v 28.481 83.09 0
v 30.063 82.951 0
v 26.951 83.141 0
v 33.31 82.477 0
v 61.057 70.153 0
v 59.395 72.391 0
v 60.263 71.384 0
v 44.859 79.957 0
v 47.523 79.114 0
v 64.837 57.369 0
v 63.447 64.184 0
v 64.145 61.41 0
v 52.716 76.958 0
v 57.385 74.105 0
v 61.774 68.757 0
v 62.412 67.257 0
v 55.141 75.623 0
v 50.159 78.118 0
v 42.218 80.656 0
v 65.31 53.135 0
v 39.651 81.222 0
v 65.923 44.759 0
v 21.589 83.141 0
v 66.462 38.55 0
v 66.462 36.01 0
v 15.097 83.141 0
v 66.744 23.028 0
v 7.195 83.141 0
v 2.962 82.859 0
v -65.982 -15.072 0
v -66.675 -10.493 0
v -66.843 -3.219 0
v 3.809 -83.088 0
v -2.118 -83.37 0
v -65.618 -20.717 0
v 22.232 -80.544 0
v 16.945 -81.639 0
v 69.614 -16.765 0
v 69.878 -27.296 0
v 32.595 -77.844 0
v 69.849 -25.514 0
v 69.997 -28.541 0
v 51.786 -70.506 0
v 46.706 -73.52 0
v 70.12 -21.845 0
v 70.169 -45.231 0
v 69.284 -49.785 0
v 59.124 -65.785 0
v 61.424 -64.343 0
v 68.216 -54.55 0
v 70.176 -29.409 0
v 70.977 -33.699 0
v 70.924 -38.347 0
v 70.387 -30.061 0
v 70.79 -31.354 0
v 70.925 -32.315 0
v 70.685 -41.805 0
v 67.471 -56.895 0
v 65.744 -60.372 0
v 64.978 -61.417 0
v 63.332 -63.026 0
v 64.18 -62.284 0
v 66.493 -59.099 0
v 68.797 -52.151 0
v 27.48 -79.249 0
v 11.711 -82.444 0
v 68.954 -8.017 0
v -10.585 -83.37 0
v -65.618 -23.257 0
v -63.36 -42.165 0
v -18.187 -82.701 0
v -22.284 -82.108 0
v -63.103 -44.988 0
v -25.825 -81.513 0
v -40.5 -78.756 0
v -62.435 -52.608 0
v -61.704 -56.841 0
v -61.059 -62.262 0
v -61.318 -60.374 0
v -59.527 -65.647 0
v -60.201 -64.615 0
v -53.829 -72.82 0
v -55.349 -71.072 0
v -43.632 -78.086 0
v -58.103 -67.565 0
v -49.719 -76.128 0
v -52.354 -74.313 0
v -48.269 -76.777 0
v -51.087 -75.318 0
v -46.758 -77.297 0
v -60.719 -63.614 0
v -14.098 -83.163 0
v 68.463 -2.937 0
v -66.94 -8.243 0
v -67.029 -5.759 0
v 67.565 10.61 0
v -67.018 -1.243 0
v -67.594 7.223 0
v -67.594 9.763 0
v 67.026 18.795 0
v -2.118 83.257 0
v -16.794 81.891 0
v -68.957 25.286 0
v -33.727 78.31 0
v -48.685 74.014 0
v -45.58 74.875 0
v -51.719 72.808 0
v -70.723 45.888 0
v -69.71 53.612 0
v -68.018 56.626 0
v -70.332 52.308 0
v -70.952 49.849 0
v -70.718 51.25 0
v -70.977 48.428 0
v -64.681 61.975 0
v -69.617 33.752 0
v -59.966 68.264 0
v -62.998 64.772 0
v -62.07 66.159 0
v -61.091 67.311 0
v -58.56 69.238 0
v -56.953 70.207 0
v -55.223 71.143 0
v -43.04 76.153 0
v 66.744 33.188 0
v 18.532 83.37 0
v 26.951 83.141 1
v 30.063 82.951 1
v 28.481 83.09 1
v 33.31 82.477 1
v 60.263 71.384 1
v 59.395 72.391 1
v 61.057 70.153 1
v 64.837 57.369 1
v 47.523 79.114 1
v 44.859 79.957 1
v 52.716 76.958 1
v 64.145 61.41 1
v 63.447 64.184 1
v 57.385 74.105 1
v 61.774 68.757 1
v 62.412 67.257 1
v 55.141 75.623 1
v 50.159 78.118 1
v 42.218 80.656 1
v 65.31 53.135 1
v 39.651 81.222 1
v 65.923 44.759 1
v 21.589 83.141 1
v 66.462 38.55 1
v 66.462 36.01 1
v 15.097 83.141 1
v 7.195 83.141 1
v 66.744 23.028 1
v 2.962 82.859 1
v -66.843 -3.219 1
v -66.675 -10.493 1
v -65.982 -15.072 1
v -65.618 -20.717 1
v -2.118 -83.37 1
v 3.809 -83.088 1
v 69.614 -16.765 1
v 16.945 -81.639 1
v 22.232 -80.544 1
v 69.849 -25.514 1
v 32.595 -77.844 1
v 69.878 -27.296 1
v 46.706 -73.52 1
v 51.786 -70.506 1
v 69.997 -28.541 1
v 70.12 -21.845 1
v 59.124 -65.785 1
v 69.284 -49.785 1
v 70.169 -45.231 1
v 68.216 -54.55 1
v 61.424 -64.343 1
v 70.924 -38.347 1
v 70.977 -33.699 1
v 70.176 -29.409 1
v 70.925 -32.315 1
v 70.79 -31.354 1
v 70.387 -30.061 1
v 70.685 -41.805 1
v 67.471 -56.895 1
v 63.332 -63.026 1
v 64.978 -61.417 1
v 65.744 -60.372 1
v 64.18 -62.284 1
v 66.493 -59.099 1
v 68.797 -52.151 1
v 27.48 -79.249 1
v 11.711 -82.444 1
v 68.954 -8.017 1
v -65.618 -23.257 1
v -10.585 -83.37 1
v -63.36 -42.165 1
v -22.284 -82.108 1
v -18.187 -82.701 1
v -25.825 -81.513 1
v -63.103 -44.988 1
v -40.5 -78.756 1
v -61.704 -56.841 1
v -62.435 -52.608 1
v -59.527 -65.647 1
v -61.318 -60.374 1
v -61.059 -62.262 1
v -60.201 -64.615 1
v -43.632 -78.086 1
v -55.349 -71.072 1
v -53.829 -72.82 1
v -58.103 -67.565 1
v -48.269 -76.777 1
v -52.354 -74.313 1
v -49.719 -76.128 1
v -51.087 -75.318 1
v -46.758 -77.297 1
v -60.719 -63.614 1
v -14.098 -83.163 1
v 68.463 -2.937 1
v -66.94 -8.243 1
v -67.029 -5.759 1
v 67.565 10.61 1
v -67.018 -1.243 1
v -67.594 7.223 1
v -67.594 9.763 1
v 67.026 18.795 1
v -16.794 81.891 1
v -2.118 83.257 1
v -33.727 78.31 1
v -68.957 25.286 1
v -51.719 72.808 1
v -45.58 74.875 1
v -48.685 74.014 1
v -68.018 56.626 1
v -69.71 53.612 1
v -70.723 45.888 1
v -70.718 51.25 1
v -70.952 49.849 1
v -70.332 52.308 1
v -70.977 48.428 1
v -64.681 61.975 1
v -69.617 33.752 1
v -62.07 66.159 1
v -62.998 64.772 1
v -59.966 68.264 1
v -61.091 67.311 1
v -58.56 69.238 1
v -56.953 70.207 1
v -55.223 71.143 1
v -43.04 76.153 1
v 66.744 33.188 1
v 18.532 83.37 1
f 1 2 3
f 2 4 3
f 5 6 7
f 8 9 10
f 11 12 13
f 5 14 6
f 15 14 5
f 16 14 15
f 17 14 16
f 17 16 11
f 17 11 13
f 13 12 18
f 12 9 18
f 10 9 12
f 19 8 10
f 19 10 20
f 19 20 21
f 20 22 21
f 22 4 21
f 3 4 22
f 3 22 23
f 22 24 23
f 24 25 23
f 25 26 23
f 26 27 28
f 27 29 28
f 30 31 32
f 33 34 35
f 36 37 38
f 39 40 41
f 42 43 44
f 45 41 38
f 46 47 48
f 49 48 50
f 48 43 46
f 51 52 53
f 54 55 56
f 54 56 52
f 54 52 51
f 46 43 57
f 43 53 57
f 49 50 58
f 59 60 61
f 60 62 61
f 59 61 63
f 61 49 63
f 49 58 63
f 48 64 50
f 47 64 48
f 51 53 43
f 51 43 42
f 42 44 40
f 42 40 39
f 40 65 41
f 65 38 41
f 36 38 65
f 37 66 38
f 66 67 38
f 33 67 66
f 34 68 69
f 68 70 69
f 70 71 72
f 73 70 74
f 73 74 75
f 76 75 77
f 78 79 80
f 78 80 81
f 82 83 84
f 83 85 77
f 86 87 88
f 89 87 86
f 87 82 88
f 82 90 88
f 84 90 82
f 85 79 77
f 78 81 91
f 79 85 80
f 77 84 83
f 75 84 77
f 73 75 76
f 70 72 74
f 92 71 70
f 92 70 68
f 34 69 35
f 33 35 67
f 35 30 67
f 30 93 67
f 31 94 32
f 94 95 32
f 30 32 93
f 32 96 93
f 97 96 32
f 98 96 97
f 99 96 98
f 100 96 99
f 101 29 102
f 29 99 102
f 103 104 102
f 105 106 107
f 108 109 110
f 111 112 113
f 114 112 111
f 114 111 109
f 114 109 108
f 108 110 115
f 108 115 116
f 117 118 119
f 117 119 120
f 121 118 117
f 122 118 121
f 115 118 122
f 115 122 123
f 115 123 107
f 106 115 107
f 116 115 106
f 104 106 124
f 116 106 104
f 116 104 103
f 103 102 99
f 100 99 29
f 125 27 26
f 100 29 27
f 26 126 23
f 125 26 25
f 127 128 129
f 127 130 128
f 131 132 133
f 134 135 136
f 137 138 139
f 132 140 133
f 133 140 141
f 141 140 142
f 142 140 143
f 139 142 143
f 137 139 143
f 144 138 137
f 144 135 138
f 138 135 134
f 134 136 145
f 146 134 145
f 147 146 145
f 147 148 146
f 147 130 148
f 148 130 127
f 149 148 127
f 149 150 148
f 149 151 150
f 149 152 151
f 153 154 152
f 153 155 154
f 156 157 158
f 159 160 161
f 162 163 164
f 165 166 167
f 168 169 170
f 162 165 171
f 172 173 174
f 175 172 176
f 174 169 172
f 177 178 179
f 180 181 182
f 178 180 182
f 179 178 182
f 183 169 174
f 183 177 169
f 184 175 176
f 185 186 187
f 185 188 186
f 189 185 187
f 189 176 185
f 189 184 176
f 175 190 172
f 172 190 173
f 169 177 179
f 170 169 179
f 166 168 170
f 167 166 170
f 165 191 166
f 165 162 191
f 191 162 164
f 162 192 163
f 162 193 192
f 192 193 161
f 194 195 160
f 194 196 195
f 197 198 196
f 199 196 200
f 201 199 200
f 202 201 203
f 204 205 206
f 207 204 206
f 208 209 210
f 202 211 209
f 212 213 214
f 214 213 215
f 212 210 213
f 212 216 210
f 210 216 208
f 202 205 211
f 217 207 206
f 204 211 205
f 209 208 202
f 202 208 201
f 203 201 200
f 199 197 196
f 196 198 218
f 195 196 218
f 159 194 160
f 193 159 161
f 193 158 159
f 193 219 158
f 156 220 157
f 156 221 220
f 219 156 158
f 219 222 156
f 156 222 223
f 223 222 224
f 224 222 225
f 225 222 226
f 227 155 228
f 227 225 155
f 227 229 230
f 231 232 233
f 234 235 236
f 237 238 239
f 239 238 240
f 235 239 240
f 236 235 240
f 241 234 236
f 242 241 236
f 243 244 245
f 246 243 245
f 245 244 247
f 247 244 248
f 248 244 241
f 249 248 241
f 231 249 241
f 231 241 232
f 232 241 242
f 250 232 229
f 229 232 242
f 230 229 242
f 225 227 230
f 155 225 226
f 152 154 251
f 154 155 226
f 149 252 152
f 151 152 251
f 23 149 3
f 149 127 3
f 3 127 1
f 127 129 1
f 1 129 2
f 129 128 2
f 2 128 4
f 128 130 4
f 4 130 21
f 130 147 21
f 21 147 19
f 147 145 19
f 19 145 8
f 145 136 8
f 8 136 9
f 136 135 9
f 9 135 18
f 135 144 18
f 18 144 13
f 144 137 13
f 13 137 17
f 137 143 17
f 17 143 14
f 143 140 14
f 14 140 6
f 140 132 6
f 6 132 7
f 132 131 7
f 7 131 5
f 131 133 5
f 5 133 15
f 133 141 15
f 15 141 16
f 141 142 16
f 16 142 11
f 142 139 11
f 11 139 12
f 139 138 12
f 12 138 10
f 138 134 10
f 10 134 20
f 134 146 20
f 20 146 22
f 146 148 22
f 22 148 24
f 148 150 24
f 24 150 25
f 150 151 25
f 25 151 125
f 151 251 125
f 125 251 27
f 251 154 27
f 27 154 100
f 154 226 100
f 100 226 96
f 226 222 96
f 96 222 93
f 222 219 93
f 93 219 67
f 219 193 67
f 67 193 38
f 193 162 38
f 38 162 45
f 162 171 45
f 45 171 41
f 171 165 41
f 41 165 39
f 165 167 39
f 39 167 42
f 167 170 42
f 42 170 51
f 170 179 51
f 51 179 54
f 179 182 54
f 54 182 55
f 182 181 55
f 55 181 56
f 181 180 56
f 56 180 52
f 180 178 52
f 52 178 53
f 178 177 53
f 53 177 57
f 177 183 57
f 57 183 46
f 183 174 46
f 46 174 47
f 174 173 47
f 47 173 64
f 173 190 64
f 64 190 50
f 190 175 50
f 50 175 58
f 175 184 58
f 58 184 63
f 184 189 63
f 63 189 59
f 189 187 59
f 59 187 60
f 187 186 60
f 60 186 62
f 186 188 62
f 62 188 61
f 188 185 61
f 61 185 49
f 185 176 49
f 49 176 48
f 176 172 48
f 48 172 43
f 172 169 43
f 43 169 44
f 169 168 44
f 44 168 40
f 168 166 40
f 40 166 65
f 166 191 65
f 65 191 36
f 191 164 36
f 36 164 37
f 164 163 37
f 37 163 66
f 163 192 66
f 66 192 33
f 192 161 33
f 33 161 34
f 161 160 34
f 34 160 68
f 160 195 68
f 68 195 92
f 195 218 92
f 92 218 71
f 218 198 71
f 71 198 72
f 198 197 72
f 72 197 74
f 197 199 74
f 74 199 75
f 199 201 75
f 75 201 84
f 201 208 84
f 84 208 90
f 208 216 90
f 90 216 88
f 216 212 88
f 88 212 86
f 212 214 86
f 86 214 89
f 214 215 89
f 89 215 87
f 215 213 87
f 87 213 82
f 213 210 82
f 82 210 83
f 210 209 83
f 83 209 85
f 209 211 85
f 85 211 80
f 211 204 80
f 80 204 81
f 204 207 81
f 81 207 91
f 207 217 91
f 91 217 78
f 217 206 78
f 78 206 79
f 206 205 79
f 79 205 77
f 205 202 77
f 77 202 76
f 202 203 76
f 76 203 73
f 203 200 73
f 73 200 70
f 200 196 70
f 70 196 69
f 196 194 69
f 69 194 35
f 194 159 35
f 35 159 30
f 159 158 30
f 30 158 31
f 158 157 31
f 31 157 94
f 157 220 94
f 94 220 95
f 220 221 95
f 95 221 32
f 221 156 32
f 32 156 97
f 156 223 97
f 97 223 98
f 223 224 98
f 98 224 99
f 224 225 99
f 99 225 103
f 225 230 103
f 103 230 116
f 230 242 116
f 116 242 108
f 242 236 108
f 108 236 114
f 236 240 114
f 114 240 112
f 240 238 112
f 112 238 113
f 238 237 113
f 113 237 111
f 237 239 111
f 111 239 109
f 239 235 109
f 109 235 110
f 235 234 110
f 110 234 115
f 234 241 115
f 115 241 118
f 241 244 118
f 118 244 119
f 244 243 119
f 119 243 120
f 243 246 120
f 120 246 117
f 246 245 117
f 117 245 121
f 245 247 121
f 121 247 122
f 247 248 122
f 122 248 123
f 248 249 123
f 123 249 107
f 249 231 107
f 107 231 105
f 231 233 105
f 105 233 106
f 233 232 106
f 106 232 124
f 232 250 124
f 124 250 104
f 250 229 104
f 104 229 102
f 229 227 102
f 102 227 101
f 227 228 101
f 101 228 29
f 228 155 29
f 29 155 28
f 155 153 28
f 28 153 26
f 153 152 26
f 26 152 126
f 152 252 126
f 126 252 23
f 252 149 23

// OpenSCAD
// Module names are of the form poly_<inkscape-path-id>().  As a result,
// you can associate a polygon in this OpenSCAD program with the corresponding
// SVG element in the Inkscape document by looking for the XML element with
// the attribute id="inkscape-path-id".

// fudge value is used to ensure that subtracted solids are a tad taller
// in the z dimension than the polygon being subtracted from.  This helps
// keep the resulting .stl file manifold.
fudge = 0.1;

module poly_Selection(h)
{
  scale([25.4/90, -25.4/90, 1]) union()
  {
    linear_extrude(height=h)
      polygon([[10.495000,-293.595000],[25.495000,-294.595000],[53.495000,-294.595000],[65.665000,-295.405000],[76.495000,-294.595000],[95.495000,-294.595000],[100.916973,-294.412324],[106.521406,-293.919219],[118.028750,-292.241250],[140.495000,-287.795000],[149.589863,-285.789746],[158.948281,-283.312344],[168.388496,-280.326582],[177.728750,-276.796250],[186.787285,-272.685137],[195.382344,-267.957031],[203.332168,-262.575723],[210.455000,-256.505000],[213.531230,-252.936113],[216.342969,-248.573281],[218.883535,-243.628496],[221.146250,-238.313750],[224.811406,-227.422344],[227.285000,-217.595000],[229.736094,-203.277188],[231.413750,-188.275000],[233.585000,-158.595000],[235.495000,-136.595000],[235.495000,-127.595000],[236.495000,-117.595000],[236.495000,-81.595000],[237.495000,-66.595000],[239.405000,-37.595000],[242.585000,10.405000],[244.325000,28.405000],[246.665000,59.405000],[248.455000,77.405000],[247.495000,90.405000],[247.600020,96.716934],[248.020156,101.127969],[248.654277,104.204707],[249.401250,106.513750],[250.829219,111.095156],[251.307949,114.500723],[251.495000,119.405000],[251.305625,135.875469],[250.460000,148.126250],[248.631875,160.266406],[245.495000,176.405000],[243.768281,184.787187],[241.708750,193.287500],[239.069844,201.596563],[235.605000,209.405000],[232.951152,213.917461],[230.238594,217.617812],[227.409551,220.690508],[224.406250,223.320000],[217.645781,227.987187],[209.495000,233.095000],[183.495000,249.825000],[165.495000,260.505000],[115.495000,275.825000],[97.369531,280.804688],[78.776250,285.392500],[60.042344,289.271562],[41.495000,292.125000],[13.495000,294.405000],[-7.505000,295.405000],[-37.505000,295.405000],[-49.954531,294.673594],[-64.441250,293.033750],[-78.959844,290.934531],[-91.505000,288.825000],[-143.505000,279.055000],[-154.602656,276.681406],[-165.678750,273.888750],[-171.032051,272.043770],[-176.167969,269.744219],[-181.015840,266.873496],[-185.505000,263.315000],[-190.732500,258.022344],[-196.117500,251.828750],[-205.875000,239.405000],[-210.922500,232.607500],[-213.311250,228.950938],[-215.145000,225.405000],[-216.349844,220.614375],[-217.268750,213.922500],[-218.635000,201.405000],[-221.225000,186.405000],[-223.595000,159.405000],[-224.505000,149.405000],[-232.505000,82.405000],[-232.505000,73.405000],[-233.795000,53.405000],[-236.250000,37.178750],[-237.189687,29.207656],[-237.505000,20.405000],[-236.845000,11.405000],[-237.465000,4.405000],[-239.505000,-25.595000],[-239.505000,-34.595000],[-244.335000,-89.595000],[-246.675000,-119.595000],[-250.595000,-162.595000],[-251.495000,-171.595000],[-251.406250,-176.628750],[-250.575000,-181.595000],[-249.208418,-185.344629],[-247.003594,-189.963906],[-241.008750,-200.643750],[-229.185000,-219.595000],[-223.222500,-229.507500],[-219.934687,-234.422500],[-216.465000,-238.505000],[-212.478965,-241.879805],[-207.496719,-245.332188],[-201.800801,-248.765352],[-195.673750,-252.082500],[-183.256406,-257.981562],[-172.505000,-262.255000],[-161.505000,-265.305000],[-152.505000,-269.835000],[-119.505000,-277.475000],[-59.505000,-290.165000],[-7.505000,-295.005000],[10.495000,-293.595000]]);
  }
}

module usb210filteroutline(h)
{

poly_Selection(h);
}

usb210filteroutline(1);
